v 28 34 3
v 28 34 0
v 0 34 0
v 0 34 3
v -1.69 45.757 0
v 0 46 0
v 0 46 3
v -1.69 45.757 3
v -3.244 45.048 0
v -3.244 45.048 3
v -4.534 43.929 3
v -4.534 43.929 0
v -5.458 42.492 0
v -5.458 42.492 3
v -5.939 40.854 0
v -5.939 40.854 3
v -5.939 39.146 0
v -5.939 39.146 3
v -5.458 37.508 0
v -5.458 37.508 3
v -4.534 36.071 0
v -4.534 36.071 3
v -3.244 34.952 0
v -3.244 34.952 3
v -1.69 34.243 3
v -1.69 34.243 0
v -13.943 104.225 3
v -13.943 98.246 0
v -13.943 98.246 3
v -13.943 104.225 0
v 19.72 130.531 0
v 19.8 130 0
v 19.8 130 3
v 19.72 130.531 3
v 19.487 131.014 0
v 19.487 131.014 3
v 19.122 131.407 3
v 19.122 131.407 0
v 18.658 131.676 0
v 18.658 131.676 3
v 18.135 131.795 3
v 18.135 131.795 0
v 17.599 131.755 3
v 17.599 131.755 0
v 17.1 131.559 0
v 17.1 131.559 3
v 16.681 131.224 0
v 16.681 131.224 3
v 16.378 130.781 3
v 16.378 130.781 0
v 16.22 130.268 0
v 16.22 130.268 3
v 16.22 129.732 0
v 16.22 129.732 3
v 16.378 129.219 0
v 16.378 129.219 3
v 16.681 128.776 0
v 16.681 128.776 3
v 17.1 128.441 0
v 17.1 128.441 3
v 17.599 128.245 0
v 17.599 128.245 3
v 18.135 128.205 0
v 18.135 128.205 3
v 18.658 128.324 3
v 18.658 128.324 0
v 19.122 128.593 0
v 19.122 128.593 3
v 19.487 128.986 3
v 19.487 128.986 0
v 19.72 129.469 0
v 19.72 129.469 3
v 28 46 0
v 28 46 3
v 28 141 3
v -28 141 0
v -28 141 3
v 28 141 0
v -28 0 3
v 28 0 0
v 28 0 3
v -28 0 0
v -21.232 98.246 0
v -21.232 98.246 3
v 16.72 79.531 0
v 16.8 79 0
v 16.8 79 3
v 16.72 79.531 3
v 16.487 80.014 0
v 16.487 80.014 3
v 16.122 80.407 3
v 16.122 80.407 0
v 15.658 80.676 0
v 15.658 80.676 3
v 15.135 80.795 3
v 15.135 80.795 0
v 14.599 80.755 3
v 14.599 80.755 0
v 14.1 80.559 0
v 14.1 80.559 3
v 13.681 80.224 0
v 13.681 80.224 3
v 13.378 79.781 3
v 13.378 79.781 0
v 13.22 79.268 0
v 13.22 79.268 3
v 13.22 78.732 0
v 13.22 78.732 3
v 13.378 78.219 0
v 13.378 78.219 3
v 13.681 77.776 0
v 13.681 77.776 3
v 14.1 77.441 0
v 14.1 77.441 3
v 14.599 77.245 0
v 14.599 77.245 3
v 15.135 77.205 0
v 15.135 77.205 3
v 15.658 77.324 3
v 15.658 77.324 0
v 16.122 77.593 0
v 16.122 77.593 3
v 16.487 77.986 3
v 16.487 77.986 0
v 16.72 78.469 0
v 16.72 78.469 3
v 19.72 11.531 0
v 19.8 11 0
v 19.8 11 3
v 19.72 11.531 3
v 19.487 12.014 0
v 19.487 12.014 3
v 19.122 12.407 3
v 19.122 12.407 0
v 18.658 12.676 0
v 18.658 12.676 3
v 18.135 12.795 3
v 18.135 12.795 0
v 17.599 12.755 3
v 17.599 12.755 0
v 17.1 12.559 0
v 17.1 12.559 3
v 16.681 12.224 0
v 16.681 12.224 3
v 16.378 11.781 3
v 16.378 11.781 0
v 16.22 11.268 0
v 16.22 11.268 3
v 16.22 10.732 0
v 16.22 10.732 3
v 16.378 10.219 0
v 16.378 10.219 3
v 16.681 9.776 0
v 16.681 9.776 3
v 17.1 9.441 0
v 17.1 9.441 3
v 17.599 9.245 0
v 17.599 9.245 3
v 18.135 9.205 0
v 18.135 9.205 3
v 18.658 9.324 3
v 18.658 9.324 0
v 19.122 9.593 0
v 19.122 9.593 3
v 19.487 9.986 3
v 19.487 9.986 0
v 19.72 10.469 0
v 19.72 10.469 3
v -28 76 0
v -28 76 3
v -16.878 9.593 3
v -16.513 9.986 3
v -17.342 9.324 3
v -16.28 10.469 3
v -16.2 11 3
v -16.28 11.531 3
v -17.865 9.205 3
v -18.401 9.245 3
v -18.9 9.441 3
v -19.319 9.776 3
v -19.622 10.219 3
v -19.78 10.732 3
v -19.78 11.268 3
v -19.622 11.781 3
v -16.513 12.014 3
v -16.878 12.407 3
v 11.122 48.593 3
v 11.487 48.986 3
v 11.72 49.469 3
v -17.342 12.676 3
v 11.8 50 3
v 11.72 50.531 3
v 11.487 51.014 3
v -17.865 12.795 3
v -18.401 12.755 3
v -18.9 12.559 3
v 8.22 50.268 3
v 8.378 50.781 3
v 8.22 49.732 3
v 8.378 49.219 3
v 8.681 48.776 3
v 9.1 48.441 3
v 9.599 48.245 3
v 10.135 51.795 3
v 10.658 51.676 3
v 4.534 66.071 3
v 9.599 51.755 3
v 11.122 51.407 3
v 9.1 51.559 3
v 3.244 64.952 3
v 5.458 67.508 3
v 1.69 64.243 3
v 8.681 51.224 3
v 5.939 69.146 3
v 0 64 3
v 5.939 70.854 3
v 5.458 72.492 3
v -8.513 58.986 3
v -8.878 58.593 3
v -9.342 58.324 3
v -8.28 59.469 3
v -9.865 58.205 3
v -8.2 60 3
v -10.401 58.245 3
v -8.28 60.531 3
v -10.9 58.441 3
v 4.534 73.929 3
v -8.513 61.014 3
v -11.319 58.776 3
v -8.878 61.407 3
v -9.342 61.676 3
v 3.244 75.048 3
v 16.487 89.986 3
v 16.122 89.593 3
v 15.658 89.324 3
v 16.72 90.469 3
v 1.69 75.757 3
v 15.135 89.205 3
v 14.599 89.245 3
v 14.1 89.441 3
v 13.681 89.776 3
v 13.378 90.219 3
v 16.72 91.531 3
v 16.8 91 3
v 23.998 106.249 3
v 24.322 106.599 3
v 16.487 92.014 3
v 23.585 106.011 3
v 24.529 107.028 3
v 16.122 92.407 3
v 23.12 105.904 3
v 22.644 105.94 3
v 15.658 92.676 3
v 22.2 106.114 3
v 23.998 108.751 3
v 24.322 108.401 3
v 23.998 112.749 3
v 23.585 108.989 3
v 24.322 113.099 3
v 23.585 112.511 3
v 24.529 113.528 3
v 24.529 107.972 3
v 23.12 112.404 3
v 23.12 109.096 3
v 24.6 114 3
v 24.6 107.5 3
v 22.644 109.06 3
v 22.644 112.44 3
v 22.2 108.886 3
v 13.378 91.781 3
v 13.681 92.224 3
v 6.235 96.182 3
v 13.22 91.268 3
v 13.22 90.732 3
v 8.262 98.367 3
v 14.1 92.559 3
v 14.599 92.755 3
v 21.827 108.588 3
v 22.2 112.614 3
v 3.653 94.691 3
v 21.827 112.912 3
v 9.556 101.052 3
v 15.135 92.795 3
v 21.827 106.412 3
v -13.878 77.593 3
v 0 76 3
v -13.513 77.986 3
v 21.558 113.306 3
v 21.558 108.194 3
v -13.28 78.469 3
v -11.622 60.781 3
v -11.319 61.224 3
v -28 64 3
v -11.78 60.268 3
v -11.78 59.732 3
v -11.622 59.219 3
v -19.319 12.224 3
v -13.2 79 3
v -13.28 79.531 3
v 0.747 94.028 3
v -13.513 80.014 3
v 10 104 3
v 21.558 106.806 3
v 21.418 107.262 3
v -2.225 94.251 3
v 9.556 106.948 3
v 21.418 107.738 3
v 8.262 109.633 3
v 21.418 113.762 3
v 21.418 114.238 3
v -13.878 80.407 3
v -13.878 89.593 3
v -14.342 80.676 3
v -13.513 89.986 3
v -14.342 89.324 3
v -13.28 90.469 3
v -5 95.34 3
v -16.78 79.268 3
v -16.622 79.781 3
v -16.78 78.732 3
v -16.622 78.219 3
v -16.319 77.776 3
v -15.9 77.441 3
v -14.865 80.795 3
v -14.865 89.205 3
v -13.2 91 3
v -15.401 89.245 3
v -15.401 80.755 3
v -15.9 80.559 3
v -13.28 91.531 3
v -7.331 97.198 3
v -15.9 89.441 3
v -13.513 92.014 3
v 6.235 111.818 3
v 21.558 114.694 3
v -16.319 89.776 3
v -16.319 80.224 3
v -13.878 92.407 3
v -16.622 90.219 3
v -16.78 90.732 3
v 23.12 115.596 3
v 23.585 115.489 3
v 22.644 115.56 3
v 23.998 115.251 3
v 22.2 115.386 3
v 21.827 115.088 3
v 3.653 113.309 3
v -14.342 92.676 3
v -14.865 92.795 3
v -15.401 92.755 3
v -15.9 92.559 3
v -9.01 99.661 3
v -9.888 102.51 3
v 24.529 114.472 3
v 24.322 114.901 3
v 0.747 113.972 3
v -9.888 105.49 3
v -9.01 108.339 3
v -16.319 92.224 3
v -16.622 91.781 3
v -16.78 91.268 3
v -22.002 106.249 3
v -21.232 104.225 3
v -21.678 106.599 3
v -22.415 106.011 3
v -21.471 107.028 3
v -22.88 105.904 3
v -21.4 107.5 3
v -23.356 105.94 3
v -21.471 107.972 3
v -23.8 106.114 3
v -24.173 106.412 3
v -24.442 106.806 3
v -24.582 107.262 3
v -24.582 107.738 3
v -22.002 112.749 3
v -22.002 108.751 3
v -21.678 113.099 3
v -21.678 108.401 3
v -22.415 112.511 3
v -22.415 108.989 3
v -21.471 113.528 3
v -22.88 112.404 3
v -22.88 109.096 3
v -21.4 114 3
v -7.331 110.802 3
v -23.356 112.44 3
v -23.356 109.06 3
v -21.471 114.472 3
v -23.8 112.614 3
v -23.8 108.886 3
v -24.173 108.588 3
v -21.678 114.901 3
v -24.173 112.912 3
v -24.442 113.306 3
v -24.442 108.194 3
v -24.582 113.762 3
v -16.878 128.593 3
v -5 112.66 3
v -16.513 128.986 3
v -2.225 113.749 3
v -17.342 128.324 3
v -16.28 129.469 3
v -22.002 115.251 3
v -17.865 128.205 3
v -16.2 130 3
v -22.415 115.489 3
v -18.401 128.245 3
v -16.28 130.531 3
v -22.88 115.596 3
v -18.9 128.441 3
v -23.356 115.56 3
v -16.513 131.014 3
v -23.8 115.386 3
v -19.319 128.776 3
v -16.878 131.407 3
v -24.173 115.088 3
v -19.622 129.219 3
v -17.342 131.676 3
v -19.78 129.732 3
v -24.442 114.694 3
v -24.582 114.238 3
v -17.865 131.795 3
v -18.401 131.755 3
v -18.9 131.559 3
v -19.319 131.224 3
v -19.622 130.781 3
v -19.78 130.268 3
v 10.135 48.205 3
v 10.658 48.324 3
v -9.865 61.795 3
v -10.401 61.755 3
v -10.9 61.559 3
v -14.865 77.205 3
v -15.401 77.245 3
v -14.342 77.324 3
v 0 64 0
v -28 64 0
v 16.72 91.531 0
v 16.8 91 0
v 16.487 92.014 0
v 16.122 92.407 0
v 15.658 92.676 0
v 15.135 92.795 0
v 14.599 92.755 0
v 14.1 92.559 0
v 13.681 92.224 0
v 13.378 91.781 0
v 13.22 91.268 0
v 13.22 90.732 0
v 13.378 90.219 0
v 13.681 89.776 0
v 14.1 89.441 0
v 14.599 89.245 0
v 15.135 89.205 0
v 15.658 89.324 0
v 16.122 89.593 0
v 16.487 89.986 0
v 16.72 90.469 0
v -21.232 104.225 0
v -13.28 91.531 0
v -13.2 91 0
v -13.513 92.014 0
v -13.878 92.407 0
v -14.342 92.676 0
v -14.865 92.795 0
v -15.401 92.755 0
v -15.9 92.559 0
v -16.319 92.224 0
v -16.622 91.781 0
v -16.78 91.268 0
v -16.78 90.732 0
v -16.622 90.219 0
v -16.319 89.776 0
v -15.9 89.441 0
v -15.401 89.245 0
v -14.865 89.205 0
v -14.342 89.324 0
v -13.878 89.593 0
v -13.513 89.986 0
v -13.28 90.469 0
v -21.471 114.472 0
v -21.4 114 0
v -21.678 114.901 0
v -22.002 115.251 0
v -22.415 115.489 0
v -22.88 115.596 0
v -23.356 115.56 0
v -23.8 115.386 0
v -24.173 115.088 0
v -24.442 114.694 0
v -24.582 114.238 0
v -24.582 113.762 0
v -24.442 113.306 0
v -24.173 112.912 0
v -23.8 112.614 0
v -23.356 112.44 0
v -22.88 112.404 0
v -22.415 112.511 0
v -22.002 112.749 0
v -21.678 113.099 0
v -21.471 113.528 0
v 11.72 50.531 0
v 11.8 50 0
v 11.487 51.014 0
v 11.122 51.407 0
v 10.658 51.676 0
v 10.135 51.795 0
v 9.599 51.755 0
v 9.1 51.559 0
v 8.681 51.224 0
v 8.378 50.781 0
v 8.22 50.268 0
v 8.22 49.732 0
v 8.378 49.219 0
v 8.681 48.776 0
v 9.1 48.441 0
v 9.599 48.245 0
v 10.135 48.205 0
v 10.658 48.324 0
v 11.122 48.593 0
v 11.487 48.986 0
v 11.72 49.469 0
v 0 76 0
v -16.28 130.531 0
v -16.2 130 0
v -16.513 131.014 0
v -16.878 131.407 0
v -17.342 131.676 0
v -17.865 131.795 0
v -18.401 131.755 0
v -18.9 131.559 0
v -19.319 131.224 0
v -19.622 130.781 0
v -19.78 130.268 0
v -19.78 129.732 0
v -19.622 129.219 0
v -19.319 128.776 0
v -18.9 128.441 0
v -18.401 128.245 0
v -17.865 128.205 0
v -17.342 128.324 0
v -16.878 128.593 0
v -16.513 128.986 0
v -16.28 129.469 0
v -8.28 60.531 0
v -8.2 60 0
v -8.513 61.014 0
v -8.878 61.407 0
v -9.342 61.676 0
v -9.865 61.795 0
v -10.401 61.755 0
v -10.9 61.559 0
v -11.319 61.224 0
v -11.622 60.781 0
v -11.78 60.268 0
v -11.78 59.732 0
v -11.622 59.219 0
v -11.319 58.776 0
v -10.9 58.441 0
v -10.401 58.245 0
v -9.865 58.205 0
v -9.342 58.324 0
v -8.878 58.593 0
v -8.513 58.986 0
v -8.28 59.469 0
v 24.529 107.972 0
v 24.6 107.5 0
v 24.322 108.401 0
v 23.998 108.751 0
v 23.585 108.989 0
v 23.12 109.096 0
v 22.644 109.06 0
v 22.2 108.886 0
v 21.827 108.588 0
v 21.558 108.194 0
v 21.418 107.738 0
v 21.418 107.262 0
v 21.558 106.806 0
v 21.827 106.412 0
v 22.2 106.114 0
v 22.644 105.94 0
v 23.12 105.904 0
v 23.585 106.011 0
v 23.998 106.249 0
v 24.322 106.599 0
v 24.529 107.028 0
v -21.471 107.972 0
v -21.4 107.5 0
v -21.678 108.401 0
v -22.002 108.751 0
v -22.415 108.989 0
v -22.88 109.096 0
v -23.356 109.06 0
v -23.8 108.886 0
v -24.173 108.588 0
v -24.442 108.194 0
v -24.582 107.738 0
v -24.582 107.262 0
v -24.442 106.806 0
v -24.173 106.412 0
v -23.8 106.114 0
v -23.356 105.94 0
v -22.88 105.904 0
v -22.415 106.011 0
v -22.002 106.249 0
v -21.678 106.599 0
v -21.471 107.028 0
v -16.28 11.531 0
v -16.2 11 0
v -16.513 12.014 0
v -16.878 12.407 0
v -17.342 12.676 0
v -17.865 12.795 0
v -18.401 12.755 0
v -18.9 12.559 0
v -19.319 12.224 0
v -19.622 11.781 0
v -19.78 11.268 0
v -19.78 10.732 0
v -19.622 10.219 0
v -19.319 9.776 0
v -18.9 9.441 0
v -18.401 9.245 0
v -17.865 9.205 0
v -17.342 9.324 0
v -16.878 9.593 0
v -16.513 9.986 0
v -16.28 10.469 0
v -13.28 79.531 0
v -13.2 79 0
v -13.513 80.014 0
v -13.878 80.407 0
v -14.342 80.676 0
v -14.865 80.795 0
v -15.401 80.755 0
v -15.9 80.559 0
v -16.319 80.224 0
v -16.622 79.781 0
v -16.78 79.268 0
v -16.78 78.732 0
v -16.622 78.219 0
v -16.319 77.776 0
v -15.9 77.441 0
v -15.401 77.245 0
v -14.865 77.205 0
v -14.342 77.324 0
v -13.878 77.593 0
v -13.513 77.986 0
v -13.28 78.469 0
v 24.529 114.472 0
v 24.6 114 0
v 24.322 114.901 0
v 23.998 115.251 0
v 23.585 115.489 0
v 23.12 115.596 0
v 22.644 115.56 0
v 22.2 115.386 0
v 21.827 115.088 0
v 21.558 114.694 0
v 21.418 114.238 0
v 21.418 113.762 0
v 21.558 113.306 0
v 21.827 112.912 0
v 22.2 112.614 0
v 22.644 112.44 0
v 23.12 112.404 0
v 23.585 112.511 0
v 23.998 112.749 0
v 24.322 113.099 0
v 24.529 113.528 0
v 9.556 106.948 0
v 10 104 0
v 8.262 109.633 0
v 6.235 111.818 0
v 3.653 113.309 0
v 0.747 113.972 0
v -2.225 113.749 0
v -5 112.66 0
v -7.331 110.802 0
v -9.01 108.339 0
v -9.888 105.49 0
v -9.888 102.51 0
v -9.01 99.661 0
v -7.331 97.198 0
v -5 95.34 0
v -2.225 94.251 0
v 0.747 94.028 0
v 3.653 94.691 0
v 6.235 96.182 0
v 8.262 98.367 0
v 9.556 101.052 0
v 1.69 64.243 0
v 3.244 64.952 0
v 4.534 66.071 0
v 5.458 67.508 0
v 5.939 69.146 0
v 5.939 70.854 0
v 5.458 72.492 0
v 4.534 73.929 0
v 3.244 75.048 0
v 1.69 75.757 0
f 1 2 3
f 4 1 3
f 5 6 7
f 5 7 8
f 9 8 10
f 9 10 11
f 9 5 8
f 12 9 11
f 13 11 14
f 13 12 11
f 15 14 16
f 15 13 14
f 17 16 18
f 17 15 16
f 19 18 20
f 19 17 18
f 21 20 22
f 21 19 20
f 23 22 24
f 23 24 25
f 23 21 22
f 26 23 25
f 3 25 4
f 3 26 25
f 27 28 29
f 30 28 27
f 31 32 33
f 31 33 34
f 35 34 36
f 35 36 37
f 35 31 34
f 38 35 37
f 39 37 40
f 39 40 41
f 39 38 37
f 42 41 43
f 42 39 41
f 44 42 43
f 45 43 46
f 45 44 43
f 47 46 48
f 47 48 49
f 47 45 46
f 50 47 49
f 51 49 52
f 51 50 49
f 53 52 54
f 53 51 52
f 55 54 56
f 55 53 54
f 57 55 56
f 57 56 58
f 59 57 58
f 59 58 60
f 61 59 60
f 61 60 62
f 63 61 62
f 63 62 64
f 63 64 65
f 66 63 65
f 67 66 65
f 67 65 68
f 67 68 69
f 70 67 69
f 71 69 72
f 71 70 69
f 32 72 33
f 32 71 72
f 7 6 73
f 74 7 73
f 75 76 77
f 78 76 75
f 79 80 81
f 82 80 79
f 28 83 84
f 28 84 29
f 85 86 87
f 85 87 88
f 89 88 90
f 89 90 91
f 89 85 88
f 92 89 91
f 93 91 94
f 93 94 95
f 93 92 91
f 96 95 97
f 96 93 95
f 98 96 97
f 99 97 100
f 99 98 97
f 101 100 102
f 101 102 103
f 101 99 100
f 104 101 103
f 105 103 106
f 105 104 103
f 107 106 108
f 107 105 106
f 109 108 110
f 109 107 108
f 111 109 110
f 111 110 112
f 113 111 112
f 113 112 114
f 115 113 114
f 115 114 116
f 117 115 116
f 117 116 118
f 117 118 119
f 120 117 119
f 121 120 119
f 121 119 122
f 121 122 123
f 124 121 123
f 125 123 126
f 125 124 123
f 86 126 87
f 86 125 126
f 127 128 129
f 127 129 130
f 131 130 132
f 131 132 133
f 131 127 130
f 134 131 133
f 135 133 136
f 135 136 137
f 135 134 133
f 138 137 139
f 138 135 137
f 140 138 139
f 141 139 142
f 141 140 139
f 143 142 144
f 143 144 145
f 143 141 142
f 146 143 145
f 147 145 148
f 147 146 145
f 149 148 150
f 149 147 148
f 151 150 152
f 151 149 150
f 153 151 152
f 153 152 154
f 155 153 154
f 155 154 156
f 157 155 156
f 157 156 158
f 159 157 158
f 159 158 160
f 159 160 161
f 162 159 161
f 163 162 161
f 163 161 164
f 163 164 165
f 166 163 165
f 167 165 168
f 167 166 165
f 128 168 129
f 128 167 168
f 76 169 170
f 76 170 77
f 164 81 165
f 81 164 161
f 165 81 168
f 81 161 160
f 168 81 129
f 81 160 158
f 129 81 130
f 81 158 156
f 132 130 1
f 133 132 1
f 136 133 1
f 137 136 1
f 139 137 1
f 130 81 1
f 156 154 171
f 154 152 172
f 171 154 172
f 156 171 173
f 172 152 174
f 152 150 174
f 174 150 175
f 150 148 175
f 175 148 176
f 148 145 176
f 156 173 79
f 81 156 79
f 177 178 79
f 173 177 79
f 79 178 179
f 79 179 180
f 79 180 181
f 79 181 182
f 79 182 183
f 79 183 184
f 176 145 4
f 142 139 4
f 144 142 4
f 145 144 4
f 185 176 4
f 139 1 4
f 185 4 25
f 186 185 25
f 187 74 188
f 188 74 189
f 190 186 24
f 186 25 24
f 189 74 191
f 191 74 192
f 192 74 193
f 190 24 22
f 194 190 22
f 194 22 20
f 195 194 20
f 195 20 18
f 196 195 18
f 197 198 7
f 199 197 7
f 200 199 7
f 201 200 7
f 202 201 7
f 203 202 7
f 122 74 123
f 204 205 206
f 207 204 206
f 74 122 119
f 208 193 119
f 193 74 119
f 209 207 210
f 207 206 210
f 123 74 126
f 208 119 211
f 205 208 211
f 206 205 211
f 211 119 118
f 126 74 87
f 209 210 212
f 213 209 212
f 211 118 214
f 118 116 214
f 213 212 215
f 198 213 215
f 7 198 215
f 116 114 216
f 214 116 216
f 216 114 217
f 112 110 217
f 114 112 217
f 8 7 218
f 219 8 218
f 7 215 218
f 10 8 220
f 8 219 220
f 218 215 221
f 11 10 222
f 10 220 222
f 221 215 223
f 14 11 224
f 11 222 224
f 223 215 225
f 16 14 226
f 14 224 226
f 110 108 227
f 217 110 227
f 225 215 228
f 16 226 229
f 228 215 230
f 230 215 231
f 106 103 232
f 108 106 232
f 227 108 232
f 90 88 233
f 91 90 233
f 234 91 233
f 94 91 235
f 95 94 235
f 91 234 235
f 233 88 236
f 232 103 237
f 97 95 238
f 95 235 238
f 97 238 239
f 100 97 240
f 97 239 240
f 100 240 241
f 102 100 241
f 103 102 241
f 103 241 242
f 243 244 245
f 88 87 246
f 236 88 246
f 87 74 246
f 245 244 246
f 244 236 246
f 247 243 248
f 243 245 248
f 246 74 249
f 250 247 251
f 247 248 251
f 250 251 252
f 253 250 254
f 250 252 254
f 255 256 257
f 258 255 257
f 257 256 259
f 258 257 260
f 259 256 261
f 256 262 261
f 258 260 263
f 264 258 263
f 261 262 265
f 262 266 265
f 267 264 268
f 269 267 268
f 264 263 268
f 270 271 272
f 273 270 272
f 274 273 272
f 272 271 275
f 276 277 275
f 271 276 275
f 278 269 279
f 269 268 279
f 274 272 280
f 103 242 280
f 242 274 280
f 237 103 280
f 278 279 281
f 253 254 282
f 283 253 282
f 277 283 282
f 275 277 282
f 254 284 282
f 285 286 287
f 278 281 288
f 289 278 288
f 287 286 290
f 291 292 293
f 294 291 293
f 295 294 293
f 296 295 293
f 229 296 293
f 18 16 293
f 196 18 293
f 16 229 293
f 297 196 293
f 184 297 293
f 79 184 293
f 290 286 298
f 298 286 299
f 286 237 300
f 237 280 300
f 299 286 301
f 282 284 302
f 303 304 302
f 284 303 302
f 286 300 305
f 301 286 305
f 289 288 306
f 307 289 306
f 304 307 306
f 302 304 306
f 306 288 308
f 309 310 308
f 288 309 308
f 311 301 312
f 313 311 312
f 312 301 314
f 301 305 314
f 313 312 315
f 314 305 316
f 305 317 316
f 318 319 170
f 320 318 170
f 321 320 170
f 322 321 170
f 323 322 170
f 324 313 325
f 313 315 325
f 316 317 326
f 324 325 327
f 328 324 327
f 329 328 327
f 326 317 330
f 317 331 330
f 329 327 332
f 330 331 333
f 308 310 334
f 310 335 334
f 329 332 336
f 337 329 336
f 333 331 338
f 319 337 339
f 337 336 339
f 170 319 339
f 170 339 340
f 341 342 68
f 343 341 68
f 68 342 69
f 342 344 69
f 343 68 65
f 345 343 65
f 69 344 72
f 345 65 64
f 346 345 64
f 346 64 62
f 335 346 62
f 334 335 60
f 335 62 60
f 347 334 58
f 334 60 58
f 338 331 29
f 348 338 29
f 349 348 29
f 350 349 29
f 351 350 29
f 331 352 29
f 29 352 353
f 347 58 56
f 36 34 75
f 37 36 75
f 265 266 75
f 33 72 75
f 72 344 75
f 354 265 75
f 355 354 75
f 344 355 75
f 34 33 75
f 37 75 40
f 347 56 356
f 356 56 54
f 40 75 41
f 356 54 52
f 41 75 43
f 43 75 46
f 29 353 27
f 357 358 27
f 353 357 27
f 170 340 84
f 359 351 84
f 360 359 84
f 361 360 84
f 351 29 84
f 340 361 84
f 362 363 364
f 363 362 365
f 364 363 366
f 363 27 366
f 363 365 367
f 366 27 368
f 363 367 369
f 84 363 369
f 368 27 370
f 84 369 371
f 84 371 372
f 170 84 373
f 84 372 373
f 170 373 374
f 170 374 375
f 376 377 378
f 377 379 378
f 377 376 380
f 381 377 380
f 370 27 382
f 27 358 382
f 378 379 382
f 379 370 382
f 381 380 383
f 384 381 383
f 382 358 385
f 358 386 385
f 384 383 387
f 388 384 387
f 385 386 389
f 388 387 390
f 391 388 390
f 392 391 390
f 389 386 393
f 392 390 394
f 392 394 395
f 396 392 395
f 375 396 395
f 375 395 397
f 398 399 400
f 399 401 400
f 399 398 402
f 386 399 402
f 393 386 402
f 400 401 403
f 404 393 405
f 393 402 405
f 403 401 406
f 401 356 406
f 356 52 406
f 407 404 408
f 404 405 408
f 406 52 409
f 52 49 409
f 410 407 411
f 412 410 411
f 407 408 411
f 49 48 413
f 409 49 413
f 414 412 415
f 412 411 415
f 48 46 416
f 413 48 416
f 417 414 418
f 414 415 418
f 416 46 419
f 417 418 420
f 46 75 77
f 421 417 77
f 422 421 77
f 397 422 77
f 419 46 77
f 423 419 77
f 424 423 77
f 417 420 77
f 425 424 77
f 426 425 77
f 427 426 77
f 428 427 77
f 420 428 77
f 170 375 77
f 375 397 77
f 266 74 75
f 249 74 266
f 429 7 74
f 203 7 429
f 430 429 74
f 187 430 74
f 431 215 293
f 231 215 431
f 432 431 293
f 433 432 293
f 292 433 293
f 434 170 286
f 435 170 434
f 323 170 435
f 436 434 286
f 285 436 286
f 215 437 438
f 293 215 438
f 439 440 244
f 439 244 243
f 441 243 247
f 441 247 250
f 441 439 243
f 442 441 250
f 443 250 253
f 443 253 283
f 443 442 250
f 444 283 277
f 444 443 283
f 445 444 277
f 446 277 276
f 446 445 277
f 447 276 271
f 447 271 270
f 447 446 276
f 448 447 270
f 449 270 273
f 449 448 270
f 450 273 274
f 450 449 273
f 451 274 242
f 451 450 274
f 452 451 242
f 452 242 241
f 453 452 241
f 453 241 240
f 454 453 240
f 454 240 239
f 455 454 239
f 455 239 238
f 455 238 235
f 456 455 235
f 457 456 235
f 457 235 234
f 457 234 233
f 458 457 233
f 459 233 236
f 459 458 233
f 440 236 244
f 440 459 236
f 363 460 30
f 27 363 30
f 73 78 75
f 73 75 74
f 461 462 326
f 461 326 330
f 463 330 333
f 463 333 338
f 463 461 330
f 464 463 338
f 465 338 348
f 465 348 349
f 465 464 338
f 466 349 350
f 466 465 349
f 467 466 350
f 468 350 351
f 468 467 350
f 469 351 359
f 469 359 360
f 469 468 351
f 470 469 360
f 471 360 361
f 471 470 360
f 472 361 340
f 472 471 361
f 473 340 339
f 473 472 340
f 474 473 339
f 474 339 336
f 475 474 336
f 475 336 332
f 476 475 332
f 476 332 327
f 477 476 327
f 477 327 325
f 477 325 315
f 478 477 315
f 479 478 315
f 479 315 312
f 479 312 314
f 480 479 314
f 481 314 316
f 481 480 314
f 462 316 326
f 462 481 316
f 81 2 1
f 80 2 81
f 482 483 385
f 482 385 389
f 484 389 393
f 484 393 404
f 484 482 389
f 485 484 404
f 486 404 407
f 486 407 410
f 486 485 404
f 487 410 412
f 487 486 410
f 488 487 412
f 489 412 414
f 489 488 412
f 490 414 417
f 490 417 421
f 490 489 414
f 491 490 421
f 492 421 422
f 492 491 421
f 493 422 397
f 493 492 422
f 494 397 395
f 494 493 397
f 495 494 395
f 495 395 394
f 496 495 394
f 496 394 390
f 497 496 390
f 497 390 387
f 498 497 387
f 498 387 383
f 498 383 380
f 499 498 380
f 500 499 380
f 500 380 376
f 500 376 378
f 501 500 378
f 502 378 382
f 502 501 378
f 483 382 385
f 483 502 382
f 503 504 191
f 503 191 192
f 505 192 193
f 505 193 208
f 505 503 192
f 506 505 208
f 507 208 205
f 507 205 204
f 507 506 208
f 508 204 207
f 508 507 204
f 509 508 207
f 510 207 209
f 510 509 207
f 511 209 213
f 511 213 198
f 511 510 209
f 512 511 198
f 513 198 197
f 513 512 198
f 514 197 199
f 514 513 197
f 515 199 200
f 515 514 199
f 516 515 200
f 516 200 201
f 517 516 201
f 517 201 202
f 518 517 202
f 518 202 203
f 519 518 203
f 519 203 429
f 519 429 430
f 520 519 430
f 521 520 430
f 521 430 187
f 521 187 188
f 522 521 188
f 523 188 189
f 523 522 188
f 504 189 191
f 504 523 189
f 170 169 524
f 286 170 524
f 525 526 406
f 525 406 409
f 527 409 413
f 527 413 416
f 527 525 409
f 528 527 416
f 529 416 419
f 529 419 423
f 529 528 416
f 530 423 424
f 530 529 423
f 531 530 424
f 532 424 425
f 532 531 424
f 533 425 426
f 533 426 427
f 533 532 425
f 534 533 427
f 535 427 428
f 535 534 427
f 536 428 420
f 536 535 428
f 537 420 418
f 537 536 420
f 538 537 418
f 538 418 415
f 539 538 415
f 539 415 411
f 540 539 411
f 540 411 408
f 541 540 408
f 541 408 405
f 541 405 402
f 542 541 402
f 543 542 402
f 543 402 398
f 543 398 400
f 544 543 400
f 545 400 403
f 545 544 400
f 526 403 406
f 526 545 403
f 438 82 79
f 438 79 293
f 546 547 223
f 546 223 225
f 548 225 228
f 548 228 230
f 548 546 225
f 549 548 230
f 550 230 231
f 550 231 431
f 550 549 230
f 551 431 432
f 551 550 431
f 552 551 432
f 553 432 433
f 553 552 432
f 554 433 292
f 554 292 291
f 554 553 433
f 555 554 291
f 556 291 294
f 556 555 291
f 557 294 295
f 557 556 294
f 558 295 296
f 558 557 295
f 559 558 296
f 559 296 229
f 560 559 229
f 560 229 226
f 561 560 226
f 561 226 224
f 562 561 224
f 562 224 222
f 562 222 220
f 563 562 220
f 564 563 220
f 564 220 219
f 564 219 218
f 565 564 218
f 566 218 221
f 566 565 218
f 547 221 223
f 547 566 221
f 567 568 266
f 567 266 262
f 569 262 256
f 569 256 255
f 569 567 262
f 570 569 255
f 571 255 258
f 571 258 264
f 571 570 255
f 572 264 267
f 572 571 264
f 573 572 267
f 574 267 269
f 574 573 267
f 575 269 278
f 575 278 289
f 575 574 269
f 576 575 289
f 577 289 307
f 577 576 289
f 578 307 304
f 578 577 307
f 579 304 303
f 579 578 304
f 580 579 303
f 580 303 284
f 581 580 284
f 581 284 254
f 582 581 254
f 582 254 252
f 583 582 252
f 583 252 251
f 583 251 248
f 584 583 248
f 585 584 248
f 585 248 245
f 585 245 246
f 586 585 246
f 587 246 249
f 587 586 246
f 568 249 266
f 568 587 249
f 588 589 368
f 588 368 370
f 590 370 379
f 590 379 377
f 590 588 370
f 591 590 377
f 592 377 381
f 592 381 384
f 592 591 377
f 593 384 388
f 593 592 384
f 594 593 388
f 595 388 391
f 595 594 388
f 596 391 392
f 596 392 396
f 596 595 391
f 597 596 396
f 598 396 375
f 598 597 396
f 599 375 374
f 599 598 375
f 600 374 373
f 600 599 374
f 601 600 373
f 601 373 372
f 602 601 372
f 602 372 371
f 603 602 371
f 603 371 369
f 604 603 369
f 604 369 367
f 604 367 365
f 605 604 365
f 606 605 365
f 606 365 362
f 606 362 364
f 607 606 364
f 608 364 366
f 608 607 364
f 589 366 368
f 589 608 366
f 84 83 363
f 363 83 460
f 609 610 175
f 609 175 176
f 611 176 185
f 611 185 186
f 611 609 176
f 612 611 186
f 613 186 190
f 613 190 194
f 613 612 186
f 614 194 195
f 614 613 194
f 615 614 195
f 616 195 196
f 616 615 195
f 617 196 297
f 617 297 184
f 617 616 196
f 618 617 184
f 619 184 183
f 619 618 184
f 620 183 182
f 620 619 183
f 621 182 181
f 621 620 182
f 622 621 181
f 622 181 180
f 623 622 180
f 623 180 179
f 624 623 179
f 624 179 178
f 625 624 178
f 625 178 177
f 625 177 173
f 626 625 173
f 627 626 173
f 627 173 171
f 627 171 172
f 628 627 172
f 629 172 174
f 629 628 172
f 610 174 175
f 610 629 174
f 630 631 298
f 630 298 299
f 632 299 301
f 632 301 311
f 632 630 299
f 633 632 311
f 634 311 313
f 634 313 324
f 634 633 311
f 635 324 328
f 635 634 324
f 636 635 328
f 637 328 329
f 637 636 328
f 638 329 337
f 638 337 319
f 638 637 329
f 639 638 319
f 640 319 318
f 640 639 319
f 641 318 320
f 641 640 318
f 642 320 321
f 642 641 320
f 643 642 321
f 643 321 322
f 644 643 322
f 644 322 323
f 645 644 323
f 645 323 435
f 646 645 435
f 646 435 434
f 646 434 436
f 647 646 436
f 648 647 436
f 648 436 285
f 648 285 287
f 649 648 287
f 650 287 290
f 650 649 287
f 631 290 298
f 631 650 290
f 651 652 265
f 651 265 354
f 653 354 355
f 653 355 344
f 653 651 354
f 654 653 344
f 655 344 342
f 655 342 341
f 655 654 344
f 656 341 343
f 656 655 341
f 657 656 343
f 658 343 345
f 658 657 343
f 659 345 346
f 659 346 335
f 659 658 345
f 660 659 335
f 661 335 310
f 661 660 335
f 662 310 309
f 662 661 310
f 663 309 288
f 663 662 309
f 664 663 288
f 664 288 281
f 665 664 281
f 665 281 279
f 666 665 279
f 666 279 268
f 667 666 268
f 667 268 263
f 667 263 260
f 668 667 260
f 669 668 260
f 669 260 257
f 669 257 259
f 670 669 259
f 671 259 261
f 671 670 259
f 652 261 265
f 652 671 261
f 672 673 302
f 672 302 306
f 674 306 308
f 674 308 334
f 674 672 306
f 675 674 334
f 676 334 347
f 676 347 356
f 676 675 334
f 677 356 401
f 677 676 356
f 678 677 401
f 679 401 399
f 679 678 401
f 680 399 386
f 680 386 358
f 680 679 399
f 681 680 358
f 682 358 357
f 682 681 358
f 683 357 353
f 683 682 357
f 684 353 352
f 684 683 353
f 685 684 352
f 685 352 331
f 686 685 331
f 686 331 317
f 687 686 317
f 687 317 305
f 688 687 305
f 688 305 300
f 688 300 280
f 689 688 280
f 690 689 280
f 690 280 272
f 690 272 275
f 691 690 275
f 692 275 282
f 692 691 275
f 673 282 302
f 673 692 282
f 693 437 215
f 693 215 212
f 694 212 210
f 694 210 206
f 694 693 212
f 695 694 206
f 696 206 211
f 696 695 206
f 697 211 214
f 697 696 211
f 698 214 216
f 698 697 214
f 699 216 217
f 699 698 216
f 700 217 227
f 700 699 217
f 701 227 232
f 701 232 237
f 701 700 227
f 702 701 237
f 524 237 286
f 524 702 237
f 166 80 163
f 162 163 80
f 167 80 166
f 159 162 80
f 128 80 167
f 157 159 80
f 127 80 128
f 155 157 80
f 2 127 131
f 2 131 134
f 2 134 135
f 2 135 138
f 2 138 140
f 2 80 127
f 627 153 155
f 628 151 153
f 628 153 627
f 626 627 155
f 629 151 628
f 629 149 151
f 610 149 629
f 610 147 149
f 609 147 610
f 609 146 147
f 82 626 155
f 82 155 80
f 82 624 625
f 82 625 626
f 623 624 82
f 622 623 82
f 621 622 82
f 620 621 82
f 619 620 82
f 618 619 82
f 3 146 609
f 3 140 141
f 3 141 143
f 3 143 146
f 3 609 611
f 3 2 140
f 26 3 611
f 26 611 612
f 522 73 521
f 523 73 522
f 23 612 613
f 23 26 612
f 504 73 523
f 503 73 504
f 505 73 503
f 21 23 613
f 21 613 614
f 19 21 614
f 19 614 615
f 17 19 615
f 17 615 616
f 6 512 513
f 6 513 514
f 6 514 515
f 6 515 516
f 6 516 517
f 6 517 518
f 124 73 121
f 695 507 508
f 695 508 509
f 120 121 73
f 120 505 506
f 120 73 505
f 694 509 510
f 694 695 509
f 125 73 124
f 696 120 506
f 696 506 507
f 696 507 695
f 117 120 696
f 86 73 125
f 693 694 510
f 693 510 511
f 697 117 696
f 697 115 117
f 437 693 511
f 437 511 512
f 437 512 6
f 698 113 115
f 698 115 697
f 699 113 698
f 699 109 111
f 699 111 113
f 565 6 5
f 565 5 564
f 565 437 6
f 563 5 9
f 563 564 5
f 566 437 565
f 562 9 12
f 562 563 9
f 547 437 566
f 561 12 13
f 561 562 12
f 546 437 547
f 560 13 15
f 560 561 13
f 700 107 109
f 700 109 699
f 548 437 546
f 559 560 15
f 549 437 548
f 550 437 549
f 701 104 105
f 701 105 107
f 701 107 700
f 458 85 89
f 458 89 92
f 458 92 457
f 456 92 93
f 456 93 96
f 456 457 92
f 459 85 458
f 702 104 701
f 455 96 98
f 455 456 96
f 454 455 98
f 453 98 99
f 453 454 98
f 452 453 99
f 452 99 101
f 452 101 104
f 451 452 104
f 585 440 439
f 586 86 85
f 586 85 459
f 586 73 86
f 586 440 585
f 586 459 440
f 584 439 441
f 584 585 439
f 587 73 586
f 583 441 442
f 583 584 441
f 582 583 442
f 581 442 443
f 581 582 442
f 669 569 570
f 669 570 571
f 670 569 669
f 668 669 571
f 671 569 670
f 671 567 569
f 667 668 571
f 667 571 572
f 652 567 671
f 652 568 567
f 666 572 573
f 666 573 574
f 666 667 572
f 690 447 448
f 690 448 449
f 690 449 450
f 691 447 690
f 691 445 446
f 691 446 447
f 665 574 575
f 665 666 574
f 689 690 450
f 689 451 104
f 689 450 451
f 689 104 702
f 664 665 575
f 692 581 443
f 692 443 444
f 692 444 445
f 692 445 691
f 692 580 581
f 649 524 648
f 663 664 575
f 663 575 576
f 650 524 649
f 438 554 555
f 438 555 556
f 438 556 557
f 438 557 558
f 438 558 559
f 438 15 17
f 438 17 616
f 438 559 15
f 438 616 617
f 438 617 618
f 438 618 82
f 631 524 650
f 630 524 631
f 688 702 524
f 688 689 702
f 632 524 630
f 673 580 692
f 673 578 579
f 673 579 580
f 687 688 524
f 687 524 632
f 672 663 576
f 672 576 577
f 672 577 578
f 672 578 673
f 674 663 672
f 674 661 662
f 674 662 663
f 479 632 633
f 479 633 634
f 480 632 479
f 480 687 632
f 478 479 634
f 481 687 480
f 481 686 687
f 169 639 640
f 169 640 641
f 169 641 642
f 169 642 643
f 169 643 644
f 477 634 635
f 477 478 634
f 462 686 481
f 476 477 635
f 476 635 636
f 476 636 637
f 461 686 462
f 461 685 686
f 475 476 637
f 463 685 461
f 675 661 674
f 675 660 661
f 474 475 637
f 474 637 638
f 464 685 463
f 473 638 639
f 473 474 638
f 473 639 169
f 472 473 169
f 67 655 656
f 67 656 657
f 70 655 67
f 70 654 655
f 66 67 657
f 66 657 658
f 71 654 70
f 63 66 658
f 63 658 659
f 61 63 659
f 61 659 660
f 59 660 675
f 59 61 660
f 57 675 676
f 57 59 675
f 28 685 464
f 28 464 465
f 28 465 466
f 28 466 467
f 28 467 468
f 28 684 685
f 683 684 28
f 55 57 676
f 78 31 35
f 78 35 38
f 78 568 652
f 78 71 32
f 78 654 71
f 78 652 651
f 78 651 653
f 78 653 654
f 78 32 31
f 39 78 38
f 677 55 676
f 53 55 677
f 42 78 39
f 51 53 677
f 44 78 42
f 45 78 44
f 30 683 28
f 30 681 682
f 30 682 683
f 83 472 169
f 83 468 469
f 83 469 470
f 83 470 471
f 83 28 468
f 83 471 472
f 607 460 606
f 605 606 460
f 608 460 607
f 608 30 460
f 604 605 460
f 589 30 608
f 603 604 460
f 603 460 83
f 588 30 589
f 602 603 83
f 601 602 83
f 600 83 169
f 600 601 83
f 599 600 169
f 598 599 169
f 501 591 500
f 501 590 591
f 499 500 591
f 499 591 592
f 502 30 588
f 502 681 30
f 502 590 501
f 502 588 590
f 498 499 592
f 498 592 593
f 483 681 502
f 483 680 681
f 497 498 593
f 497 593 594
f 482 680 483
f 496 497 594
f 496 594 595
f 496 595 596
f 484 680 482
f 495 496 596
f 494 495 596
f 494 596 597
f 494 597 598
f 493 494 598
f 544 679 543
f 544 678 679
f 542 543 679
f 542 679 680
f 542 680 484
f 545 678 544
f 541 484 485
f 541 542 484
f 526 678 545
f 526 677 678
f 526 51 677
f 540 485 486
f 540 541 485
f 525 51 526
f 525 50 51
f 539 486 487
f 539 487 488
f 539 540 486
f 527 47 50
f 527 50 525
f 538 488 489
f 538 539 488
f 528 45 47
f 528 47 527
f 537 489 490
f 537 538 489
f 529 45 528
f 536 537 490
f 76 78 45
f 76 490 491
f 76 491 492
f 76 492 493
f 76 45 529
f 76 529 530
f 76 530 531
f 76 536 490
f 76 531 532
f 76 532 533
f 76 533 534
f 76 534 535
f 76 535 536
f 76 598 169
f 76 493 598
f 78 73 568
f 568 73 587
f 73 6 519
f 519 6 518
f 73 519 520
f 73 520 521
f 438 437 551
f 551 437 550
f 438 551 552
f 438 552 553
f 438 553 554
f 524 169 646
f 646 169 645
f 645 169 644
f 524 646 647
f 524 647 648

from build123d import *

# Parameters (mm, degrees)
SKETCH_R   = 10
SKETCH_R_2 = 1.8
SKETCH_R_3 = 1.6
SKETCH_W   = 7.288706
SKETCH_H   = 5.97866
PAD_DEPTH  = 3


with BuildPart() as part:
    # Sketch → Pad (new body)
    with BuildSketch(Plane.XY):
        with BuildLine():
            Line((-28, 141), (28, 141))
            Line((28, 141), (28, 46))
            Line((0, 46), (28, 46))
            ThreePointArc((0, 46), (-6, 40), (0, 34))
            Line((28, 34), (0, 34))
            Line((28, 34), (28, 0))
            Line((28, 0), (-28, 0))
            Line((-28, 0), (-28, 64))
            Line((0, 64), (-28, 64))
            ThreePointArc((0, 64), (6, 70), (0, 76))
            Line((-28, 76), (0, 76))
            Line((-28, 76), (-28, 141))
        make_face()
        with Locations((0, 104)):
            Circle(SKETCH_R, mode=Mode.SUBTRACT)
        with Locations((-18, 130)):
            Circle(SKETCH_R_2, mode=Mode.SUBTRACT)
        with Locations((18, 130)):
            Circle(SKETCH_R_2, mode=Mode.SUBTRACT)
        with Locations((-18, 11)):
            Circle(SKETCH_R_2, mode=Mode.SUBTRACT)
        with Locations((18, 11)):
            Circle(SKETCH_R_2, mode=Mode.SUBTRACT)
        with Locations((-23, 114)):
            Circle(SKETCH_R_3, mode=Mode.SUBTRACT)
        with Locations((-23, 107.5)):
            Circle(SKETCH_R_3, mode=Mode.SUBTRACT)
        with Locations((23, 114)):
            Circle(SKETCH_R_3, mode=Mode.SUBTRACT)
        with Locations((23, 107.5)):
            Circle(SKETCH_R_3, mode=Mode.SUBTRACT)
        with Locations((-10, 60)):
            Circle(SKETCH_R_2, mode=Mode.SUBTRACT)
        with Locations((10, 50)):
            Circle(SKETCH_R_2, mode=Mode.SUBTRACT)
        with Locations((-15, 91)):
            Circle(SKETCH_R_2, mode=Mode.SUBTRACT)
        with Locations((-15, 79)):
            Circle(SKETCH_R_2, mode=Mode.SUBTRACT)
        with Locations((15, 91)):
            Circle(SKETCH_R_2, mode=Mode.SUBTRACT)
        with Locations((15, 79)):
            Circle(SKETCH_R_2, mode=Mode.SUBTRACT)
        with Locations((-17.587784, 101.235753)):
            Rectangle(SKETCH_W, SKETCH_H, mode=Mode.SUBTRACT)
    extrude(amount=PAD_DEPTH)


solid = part.part
